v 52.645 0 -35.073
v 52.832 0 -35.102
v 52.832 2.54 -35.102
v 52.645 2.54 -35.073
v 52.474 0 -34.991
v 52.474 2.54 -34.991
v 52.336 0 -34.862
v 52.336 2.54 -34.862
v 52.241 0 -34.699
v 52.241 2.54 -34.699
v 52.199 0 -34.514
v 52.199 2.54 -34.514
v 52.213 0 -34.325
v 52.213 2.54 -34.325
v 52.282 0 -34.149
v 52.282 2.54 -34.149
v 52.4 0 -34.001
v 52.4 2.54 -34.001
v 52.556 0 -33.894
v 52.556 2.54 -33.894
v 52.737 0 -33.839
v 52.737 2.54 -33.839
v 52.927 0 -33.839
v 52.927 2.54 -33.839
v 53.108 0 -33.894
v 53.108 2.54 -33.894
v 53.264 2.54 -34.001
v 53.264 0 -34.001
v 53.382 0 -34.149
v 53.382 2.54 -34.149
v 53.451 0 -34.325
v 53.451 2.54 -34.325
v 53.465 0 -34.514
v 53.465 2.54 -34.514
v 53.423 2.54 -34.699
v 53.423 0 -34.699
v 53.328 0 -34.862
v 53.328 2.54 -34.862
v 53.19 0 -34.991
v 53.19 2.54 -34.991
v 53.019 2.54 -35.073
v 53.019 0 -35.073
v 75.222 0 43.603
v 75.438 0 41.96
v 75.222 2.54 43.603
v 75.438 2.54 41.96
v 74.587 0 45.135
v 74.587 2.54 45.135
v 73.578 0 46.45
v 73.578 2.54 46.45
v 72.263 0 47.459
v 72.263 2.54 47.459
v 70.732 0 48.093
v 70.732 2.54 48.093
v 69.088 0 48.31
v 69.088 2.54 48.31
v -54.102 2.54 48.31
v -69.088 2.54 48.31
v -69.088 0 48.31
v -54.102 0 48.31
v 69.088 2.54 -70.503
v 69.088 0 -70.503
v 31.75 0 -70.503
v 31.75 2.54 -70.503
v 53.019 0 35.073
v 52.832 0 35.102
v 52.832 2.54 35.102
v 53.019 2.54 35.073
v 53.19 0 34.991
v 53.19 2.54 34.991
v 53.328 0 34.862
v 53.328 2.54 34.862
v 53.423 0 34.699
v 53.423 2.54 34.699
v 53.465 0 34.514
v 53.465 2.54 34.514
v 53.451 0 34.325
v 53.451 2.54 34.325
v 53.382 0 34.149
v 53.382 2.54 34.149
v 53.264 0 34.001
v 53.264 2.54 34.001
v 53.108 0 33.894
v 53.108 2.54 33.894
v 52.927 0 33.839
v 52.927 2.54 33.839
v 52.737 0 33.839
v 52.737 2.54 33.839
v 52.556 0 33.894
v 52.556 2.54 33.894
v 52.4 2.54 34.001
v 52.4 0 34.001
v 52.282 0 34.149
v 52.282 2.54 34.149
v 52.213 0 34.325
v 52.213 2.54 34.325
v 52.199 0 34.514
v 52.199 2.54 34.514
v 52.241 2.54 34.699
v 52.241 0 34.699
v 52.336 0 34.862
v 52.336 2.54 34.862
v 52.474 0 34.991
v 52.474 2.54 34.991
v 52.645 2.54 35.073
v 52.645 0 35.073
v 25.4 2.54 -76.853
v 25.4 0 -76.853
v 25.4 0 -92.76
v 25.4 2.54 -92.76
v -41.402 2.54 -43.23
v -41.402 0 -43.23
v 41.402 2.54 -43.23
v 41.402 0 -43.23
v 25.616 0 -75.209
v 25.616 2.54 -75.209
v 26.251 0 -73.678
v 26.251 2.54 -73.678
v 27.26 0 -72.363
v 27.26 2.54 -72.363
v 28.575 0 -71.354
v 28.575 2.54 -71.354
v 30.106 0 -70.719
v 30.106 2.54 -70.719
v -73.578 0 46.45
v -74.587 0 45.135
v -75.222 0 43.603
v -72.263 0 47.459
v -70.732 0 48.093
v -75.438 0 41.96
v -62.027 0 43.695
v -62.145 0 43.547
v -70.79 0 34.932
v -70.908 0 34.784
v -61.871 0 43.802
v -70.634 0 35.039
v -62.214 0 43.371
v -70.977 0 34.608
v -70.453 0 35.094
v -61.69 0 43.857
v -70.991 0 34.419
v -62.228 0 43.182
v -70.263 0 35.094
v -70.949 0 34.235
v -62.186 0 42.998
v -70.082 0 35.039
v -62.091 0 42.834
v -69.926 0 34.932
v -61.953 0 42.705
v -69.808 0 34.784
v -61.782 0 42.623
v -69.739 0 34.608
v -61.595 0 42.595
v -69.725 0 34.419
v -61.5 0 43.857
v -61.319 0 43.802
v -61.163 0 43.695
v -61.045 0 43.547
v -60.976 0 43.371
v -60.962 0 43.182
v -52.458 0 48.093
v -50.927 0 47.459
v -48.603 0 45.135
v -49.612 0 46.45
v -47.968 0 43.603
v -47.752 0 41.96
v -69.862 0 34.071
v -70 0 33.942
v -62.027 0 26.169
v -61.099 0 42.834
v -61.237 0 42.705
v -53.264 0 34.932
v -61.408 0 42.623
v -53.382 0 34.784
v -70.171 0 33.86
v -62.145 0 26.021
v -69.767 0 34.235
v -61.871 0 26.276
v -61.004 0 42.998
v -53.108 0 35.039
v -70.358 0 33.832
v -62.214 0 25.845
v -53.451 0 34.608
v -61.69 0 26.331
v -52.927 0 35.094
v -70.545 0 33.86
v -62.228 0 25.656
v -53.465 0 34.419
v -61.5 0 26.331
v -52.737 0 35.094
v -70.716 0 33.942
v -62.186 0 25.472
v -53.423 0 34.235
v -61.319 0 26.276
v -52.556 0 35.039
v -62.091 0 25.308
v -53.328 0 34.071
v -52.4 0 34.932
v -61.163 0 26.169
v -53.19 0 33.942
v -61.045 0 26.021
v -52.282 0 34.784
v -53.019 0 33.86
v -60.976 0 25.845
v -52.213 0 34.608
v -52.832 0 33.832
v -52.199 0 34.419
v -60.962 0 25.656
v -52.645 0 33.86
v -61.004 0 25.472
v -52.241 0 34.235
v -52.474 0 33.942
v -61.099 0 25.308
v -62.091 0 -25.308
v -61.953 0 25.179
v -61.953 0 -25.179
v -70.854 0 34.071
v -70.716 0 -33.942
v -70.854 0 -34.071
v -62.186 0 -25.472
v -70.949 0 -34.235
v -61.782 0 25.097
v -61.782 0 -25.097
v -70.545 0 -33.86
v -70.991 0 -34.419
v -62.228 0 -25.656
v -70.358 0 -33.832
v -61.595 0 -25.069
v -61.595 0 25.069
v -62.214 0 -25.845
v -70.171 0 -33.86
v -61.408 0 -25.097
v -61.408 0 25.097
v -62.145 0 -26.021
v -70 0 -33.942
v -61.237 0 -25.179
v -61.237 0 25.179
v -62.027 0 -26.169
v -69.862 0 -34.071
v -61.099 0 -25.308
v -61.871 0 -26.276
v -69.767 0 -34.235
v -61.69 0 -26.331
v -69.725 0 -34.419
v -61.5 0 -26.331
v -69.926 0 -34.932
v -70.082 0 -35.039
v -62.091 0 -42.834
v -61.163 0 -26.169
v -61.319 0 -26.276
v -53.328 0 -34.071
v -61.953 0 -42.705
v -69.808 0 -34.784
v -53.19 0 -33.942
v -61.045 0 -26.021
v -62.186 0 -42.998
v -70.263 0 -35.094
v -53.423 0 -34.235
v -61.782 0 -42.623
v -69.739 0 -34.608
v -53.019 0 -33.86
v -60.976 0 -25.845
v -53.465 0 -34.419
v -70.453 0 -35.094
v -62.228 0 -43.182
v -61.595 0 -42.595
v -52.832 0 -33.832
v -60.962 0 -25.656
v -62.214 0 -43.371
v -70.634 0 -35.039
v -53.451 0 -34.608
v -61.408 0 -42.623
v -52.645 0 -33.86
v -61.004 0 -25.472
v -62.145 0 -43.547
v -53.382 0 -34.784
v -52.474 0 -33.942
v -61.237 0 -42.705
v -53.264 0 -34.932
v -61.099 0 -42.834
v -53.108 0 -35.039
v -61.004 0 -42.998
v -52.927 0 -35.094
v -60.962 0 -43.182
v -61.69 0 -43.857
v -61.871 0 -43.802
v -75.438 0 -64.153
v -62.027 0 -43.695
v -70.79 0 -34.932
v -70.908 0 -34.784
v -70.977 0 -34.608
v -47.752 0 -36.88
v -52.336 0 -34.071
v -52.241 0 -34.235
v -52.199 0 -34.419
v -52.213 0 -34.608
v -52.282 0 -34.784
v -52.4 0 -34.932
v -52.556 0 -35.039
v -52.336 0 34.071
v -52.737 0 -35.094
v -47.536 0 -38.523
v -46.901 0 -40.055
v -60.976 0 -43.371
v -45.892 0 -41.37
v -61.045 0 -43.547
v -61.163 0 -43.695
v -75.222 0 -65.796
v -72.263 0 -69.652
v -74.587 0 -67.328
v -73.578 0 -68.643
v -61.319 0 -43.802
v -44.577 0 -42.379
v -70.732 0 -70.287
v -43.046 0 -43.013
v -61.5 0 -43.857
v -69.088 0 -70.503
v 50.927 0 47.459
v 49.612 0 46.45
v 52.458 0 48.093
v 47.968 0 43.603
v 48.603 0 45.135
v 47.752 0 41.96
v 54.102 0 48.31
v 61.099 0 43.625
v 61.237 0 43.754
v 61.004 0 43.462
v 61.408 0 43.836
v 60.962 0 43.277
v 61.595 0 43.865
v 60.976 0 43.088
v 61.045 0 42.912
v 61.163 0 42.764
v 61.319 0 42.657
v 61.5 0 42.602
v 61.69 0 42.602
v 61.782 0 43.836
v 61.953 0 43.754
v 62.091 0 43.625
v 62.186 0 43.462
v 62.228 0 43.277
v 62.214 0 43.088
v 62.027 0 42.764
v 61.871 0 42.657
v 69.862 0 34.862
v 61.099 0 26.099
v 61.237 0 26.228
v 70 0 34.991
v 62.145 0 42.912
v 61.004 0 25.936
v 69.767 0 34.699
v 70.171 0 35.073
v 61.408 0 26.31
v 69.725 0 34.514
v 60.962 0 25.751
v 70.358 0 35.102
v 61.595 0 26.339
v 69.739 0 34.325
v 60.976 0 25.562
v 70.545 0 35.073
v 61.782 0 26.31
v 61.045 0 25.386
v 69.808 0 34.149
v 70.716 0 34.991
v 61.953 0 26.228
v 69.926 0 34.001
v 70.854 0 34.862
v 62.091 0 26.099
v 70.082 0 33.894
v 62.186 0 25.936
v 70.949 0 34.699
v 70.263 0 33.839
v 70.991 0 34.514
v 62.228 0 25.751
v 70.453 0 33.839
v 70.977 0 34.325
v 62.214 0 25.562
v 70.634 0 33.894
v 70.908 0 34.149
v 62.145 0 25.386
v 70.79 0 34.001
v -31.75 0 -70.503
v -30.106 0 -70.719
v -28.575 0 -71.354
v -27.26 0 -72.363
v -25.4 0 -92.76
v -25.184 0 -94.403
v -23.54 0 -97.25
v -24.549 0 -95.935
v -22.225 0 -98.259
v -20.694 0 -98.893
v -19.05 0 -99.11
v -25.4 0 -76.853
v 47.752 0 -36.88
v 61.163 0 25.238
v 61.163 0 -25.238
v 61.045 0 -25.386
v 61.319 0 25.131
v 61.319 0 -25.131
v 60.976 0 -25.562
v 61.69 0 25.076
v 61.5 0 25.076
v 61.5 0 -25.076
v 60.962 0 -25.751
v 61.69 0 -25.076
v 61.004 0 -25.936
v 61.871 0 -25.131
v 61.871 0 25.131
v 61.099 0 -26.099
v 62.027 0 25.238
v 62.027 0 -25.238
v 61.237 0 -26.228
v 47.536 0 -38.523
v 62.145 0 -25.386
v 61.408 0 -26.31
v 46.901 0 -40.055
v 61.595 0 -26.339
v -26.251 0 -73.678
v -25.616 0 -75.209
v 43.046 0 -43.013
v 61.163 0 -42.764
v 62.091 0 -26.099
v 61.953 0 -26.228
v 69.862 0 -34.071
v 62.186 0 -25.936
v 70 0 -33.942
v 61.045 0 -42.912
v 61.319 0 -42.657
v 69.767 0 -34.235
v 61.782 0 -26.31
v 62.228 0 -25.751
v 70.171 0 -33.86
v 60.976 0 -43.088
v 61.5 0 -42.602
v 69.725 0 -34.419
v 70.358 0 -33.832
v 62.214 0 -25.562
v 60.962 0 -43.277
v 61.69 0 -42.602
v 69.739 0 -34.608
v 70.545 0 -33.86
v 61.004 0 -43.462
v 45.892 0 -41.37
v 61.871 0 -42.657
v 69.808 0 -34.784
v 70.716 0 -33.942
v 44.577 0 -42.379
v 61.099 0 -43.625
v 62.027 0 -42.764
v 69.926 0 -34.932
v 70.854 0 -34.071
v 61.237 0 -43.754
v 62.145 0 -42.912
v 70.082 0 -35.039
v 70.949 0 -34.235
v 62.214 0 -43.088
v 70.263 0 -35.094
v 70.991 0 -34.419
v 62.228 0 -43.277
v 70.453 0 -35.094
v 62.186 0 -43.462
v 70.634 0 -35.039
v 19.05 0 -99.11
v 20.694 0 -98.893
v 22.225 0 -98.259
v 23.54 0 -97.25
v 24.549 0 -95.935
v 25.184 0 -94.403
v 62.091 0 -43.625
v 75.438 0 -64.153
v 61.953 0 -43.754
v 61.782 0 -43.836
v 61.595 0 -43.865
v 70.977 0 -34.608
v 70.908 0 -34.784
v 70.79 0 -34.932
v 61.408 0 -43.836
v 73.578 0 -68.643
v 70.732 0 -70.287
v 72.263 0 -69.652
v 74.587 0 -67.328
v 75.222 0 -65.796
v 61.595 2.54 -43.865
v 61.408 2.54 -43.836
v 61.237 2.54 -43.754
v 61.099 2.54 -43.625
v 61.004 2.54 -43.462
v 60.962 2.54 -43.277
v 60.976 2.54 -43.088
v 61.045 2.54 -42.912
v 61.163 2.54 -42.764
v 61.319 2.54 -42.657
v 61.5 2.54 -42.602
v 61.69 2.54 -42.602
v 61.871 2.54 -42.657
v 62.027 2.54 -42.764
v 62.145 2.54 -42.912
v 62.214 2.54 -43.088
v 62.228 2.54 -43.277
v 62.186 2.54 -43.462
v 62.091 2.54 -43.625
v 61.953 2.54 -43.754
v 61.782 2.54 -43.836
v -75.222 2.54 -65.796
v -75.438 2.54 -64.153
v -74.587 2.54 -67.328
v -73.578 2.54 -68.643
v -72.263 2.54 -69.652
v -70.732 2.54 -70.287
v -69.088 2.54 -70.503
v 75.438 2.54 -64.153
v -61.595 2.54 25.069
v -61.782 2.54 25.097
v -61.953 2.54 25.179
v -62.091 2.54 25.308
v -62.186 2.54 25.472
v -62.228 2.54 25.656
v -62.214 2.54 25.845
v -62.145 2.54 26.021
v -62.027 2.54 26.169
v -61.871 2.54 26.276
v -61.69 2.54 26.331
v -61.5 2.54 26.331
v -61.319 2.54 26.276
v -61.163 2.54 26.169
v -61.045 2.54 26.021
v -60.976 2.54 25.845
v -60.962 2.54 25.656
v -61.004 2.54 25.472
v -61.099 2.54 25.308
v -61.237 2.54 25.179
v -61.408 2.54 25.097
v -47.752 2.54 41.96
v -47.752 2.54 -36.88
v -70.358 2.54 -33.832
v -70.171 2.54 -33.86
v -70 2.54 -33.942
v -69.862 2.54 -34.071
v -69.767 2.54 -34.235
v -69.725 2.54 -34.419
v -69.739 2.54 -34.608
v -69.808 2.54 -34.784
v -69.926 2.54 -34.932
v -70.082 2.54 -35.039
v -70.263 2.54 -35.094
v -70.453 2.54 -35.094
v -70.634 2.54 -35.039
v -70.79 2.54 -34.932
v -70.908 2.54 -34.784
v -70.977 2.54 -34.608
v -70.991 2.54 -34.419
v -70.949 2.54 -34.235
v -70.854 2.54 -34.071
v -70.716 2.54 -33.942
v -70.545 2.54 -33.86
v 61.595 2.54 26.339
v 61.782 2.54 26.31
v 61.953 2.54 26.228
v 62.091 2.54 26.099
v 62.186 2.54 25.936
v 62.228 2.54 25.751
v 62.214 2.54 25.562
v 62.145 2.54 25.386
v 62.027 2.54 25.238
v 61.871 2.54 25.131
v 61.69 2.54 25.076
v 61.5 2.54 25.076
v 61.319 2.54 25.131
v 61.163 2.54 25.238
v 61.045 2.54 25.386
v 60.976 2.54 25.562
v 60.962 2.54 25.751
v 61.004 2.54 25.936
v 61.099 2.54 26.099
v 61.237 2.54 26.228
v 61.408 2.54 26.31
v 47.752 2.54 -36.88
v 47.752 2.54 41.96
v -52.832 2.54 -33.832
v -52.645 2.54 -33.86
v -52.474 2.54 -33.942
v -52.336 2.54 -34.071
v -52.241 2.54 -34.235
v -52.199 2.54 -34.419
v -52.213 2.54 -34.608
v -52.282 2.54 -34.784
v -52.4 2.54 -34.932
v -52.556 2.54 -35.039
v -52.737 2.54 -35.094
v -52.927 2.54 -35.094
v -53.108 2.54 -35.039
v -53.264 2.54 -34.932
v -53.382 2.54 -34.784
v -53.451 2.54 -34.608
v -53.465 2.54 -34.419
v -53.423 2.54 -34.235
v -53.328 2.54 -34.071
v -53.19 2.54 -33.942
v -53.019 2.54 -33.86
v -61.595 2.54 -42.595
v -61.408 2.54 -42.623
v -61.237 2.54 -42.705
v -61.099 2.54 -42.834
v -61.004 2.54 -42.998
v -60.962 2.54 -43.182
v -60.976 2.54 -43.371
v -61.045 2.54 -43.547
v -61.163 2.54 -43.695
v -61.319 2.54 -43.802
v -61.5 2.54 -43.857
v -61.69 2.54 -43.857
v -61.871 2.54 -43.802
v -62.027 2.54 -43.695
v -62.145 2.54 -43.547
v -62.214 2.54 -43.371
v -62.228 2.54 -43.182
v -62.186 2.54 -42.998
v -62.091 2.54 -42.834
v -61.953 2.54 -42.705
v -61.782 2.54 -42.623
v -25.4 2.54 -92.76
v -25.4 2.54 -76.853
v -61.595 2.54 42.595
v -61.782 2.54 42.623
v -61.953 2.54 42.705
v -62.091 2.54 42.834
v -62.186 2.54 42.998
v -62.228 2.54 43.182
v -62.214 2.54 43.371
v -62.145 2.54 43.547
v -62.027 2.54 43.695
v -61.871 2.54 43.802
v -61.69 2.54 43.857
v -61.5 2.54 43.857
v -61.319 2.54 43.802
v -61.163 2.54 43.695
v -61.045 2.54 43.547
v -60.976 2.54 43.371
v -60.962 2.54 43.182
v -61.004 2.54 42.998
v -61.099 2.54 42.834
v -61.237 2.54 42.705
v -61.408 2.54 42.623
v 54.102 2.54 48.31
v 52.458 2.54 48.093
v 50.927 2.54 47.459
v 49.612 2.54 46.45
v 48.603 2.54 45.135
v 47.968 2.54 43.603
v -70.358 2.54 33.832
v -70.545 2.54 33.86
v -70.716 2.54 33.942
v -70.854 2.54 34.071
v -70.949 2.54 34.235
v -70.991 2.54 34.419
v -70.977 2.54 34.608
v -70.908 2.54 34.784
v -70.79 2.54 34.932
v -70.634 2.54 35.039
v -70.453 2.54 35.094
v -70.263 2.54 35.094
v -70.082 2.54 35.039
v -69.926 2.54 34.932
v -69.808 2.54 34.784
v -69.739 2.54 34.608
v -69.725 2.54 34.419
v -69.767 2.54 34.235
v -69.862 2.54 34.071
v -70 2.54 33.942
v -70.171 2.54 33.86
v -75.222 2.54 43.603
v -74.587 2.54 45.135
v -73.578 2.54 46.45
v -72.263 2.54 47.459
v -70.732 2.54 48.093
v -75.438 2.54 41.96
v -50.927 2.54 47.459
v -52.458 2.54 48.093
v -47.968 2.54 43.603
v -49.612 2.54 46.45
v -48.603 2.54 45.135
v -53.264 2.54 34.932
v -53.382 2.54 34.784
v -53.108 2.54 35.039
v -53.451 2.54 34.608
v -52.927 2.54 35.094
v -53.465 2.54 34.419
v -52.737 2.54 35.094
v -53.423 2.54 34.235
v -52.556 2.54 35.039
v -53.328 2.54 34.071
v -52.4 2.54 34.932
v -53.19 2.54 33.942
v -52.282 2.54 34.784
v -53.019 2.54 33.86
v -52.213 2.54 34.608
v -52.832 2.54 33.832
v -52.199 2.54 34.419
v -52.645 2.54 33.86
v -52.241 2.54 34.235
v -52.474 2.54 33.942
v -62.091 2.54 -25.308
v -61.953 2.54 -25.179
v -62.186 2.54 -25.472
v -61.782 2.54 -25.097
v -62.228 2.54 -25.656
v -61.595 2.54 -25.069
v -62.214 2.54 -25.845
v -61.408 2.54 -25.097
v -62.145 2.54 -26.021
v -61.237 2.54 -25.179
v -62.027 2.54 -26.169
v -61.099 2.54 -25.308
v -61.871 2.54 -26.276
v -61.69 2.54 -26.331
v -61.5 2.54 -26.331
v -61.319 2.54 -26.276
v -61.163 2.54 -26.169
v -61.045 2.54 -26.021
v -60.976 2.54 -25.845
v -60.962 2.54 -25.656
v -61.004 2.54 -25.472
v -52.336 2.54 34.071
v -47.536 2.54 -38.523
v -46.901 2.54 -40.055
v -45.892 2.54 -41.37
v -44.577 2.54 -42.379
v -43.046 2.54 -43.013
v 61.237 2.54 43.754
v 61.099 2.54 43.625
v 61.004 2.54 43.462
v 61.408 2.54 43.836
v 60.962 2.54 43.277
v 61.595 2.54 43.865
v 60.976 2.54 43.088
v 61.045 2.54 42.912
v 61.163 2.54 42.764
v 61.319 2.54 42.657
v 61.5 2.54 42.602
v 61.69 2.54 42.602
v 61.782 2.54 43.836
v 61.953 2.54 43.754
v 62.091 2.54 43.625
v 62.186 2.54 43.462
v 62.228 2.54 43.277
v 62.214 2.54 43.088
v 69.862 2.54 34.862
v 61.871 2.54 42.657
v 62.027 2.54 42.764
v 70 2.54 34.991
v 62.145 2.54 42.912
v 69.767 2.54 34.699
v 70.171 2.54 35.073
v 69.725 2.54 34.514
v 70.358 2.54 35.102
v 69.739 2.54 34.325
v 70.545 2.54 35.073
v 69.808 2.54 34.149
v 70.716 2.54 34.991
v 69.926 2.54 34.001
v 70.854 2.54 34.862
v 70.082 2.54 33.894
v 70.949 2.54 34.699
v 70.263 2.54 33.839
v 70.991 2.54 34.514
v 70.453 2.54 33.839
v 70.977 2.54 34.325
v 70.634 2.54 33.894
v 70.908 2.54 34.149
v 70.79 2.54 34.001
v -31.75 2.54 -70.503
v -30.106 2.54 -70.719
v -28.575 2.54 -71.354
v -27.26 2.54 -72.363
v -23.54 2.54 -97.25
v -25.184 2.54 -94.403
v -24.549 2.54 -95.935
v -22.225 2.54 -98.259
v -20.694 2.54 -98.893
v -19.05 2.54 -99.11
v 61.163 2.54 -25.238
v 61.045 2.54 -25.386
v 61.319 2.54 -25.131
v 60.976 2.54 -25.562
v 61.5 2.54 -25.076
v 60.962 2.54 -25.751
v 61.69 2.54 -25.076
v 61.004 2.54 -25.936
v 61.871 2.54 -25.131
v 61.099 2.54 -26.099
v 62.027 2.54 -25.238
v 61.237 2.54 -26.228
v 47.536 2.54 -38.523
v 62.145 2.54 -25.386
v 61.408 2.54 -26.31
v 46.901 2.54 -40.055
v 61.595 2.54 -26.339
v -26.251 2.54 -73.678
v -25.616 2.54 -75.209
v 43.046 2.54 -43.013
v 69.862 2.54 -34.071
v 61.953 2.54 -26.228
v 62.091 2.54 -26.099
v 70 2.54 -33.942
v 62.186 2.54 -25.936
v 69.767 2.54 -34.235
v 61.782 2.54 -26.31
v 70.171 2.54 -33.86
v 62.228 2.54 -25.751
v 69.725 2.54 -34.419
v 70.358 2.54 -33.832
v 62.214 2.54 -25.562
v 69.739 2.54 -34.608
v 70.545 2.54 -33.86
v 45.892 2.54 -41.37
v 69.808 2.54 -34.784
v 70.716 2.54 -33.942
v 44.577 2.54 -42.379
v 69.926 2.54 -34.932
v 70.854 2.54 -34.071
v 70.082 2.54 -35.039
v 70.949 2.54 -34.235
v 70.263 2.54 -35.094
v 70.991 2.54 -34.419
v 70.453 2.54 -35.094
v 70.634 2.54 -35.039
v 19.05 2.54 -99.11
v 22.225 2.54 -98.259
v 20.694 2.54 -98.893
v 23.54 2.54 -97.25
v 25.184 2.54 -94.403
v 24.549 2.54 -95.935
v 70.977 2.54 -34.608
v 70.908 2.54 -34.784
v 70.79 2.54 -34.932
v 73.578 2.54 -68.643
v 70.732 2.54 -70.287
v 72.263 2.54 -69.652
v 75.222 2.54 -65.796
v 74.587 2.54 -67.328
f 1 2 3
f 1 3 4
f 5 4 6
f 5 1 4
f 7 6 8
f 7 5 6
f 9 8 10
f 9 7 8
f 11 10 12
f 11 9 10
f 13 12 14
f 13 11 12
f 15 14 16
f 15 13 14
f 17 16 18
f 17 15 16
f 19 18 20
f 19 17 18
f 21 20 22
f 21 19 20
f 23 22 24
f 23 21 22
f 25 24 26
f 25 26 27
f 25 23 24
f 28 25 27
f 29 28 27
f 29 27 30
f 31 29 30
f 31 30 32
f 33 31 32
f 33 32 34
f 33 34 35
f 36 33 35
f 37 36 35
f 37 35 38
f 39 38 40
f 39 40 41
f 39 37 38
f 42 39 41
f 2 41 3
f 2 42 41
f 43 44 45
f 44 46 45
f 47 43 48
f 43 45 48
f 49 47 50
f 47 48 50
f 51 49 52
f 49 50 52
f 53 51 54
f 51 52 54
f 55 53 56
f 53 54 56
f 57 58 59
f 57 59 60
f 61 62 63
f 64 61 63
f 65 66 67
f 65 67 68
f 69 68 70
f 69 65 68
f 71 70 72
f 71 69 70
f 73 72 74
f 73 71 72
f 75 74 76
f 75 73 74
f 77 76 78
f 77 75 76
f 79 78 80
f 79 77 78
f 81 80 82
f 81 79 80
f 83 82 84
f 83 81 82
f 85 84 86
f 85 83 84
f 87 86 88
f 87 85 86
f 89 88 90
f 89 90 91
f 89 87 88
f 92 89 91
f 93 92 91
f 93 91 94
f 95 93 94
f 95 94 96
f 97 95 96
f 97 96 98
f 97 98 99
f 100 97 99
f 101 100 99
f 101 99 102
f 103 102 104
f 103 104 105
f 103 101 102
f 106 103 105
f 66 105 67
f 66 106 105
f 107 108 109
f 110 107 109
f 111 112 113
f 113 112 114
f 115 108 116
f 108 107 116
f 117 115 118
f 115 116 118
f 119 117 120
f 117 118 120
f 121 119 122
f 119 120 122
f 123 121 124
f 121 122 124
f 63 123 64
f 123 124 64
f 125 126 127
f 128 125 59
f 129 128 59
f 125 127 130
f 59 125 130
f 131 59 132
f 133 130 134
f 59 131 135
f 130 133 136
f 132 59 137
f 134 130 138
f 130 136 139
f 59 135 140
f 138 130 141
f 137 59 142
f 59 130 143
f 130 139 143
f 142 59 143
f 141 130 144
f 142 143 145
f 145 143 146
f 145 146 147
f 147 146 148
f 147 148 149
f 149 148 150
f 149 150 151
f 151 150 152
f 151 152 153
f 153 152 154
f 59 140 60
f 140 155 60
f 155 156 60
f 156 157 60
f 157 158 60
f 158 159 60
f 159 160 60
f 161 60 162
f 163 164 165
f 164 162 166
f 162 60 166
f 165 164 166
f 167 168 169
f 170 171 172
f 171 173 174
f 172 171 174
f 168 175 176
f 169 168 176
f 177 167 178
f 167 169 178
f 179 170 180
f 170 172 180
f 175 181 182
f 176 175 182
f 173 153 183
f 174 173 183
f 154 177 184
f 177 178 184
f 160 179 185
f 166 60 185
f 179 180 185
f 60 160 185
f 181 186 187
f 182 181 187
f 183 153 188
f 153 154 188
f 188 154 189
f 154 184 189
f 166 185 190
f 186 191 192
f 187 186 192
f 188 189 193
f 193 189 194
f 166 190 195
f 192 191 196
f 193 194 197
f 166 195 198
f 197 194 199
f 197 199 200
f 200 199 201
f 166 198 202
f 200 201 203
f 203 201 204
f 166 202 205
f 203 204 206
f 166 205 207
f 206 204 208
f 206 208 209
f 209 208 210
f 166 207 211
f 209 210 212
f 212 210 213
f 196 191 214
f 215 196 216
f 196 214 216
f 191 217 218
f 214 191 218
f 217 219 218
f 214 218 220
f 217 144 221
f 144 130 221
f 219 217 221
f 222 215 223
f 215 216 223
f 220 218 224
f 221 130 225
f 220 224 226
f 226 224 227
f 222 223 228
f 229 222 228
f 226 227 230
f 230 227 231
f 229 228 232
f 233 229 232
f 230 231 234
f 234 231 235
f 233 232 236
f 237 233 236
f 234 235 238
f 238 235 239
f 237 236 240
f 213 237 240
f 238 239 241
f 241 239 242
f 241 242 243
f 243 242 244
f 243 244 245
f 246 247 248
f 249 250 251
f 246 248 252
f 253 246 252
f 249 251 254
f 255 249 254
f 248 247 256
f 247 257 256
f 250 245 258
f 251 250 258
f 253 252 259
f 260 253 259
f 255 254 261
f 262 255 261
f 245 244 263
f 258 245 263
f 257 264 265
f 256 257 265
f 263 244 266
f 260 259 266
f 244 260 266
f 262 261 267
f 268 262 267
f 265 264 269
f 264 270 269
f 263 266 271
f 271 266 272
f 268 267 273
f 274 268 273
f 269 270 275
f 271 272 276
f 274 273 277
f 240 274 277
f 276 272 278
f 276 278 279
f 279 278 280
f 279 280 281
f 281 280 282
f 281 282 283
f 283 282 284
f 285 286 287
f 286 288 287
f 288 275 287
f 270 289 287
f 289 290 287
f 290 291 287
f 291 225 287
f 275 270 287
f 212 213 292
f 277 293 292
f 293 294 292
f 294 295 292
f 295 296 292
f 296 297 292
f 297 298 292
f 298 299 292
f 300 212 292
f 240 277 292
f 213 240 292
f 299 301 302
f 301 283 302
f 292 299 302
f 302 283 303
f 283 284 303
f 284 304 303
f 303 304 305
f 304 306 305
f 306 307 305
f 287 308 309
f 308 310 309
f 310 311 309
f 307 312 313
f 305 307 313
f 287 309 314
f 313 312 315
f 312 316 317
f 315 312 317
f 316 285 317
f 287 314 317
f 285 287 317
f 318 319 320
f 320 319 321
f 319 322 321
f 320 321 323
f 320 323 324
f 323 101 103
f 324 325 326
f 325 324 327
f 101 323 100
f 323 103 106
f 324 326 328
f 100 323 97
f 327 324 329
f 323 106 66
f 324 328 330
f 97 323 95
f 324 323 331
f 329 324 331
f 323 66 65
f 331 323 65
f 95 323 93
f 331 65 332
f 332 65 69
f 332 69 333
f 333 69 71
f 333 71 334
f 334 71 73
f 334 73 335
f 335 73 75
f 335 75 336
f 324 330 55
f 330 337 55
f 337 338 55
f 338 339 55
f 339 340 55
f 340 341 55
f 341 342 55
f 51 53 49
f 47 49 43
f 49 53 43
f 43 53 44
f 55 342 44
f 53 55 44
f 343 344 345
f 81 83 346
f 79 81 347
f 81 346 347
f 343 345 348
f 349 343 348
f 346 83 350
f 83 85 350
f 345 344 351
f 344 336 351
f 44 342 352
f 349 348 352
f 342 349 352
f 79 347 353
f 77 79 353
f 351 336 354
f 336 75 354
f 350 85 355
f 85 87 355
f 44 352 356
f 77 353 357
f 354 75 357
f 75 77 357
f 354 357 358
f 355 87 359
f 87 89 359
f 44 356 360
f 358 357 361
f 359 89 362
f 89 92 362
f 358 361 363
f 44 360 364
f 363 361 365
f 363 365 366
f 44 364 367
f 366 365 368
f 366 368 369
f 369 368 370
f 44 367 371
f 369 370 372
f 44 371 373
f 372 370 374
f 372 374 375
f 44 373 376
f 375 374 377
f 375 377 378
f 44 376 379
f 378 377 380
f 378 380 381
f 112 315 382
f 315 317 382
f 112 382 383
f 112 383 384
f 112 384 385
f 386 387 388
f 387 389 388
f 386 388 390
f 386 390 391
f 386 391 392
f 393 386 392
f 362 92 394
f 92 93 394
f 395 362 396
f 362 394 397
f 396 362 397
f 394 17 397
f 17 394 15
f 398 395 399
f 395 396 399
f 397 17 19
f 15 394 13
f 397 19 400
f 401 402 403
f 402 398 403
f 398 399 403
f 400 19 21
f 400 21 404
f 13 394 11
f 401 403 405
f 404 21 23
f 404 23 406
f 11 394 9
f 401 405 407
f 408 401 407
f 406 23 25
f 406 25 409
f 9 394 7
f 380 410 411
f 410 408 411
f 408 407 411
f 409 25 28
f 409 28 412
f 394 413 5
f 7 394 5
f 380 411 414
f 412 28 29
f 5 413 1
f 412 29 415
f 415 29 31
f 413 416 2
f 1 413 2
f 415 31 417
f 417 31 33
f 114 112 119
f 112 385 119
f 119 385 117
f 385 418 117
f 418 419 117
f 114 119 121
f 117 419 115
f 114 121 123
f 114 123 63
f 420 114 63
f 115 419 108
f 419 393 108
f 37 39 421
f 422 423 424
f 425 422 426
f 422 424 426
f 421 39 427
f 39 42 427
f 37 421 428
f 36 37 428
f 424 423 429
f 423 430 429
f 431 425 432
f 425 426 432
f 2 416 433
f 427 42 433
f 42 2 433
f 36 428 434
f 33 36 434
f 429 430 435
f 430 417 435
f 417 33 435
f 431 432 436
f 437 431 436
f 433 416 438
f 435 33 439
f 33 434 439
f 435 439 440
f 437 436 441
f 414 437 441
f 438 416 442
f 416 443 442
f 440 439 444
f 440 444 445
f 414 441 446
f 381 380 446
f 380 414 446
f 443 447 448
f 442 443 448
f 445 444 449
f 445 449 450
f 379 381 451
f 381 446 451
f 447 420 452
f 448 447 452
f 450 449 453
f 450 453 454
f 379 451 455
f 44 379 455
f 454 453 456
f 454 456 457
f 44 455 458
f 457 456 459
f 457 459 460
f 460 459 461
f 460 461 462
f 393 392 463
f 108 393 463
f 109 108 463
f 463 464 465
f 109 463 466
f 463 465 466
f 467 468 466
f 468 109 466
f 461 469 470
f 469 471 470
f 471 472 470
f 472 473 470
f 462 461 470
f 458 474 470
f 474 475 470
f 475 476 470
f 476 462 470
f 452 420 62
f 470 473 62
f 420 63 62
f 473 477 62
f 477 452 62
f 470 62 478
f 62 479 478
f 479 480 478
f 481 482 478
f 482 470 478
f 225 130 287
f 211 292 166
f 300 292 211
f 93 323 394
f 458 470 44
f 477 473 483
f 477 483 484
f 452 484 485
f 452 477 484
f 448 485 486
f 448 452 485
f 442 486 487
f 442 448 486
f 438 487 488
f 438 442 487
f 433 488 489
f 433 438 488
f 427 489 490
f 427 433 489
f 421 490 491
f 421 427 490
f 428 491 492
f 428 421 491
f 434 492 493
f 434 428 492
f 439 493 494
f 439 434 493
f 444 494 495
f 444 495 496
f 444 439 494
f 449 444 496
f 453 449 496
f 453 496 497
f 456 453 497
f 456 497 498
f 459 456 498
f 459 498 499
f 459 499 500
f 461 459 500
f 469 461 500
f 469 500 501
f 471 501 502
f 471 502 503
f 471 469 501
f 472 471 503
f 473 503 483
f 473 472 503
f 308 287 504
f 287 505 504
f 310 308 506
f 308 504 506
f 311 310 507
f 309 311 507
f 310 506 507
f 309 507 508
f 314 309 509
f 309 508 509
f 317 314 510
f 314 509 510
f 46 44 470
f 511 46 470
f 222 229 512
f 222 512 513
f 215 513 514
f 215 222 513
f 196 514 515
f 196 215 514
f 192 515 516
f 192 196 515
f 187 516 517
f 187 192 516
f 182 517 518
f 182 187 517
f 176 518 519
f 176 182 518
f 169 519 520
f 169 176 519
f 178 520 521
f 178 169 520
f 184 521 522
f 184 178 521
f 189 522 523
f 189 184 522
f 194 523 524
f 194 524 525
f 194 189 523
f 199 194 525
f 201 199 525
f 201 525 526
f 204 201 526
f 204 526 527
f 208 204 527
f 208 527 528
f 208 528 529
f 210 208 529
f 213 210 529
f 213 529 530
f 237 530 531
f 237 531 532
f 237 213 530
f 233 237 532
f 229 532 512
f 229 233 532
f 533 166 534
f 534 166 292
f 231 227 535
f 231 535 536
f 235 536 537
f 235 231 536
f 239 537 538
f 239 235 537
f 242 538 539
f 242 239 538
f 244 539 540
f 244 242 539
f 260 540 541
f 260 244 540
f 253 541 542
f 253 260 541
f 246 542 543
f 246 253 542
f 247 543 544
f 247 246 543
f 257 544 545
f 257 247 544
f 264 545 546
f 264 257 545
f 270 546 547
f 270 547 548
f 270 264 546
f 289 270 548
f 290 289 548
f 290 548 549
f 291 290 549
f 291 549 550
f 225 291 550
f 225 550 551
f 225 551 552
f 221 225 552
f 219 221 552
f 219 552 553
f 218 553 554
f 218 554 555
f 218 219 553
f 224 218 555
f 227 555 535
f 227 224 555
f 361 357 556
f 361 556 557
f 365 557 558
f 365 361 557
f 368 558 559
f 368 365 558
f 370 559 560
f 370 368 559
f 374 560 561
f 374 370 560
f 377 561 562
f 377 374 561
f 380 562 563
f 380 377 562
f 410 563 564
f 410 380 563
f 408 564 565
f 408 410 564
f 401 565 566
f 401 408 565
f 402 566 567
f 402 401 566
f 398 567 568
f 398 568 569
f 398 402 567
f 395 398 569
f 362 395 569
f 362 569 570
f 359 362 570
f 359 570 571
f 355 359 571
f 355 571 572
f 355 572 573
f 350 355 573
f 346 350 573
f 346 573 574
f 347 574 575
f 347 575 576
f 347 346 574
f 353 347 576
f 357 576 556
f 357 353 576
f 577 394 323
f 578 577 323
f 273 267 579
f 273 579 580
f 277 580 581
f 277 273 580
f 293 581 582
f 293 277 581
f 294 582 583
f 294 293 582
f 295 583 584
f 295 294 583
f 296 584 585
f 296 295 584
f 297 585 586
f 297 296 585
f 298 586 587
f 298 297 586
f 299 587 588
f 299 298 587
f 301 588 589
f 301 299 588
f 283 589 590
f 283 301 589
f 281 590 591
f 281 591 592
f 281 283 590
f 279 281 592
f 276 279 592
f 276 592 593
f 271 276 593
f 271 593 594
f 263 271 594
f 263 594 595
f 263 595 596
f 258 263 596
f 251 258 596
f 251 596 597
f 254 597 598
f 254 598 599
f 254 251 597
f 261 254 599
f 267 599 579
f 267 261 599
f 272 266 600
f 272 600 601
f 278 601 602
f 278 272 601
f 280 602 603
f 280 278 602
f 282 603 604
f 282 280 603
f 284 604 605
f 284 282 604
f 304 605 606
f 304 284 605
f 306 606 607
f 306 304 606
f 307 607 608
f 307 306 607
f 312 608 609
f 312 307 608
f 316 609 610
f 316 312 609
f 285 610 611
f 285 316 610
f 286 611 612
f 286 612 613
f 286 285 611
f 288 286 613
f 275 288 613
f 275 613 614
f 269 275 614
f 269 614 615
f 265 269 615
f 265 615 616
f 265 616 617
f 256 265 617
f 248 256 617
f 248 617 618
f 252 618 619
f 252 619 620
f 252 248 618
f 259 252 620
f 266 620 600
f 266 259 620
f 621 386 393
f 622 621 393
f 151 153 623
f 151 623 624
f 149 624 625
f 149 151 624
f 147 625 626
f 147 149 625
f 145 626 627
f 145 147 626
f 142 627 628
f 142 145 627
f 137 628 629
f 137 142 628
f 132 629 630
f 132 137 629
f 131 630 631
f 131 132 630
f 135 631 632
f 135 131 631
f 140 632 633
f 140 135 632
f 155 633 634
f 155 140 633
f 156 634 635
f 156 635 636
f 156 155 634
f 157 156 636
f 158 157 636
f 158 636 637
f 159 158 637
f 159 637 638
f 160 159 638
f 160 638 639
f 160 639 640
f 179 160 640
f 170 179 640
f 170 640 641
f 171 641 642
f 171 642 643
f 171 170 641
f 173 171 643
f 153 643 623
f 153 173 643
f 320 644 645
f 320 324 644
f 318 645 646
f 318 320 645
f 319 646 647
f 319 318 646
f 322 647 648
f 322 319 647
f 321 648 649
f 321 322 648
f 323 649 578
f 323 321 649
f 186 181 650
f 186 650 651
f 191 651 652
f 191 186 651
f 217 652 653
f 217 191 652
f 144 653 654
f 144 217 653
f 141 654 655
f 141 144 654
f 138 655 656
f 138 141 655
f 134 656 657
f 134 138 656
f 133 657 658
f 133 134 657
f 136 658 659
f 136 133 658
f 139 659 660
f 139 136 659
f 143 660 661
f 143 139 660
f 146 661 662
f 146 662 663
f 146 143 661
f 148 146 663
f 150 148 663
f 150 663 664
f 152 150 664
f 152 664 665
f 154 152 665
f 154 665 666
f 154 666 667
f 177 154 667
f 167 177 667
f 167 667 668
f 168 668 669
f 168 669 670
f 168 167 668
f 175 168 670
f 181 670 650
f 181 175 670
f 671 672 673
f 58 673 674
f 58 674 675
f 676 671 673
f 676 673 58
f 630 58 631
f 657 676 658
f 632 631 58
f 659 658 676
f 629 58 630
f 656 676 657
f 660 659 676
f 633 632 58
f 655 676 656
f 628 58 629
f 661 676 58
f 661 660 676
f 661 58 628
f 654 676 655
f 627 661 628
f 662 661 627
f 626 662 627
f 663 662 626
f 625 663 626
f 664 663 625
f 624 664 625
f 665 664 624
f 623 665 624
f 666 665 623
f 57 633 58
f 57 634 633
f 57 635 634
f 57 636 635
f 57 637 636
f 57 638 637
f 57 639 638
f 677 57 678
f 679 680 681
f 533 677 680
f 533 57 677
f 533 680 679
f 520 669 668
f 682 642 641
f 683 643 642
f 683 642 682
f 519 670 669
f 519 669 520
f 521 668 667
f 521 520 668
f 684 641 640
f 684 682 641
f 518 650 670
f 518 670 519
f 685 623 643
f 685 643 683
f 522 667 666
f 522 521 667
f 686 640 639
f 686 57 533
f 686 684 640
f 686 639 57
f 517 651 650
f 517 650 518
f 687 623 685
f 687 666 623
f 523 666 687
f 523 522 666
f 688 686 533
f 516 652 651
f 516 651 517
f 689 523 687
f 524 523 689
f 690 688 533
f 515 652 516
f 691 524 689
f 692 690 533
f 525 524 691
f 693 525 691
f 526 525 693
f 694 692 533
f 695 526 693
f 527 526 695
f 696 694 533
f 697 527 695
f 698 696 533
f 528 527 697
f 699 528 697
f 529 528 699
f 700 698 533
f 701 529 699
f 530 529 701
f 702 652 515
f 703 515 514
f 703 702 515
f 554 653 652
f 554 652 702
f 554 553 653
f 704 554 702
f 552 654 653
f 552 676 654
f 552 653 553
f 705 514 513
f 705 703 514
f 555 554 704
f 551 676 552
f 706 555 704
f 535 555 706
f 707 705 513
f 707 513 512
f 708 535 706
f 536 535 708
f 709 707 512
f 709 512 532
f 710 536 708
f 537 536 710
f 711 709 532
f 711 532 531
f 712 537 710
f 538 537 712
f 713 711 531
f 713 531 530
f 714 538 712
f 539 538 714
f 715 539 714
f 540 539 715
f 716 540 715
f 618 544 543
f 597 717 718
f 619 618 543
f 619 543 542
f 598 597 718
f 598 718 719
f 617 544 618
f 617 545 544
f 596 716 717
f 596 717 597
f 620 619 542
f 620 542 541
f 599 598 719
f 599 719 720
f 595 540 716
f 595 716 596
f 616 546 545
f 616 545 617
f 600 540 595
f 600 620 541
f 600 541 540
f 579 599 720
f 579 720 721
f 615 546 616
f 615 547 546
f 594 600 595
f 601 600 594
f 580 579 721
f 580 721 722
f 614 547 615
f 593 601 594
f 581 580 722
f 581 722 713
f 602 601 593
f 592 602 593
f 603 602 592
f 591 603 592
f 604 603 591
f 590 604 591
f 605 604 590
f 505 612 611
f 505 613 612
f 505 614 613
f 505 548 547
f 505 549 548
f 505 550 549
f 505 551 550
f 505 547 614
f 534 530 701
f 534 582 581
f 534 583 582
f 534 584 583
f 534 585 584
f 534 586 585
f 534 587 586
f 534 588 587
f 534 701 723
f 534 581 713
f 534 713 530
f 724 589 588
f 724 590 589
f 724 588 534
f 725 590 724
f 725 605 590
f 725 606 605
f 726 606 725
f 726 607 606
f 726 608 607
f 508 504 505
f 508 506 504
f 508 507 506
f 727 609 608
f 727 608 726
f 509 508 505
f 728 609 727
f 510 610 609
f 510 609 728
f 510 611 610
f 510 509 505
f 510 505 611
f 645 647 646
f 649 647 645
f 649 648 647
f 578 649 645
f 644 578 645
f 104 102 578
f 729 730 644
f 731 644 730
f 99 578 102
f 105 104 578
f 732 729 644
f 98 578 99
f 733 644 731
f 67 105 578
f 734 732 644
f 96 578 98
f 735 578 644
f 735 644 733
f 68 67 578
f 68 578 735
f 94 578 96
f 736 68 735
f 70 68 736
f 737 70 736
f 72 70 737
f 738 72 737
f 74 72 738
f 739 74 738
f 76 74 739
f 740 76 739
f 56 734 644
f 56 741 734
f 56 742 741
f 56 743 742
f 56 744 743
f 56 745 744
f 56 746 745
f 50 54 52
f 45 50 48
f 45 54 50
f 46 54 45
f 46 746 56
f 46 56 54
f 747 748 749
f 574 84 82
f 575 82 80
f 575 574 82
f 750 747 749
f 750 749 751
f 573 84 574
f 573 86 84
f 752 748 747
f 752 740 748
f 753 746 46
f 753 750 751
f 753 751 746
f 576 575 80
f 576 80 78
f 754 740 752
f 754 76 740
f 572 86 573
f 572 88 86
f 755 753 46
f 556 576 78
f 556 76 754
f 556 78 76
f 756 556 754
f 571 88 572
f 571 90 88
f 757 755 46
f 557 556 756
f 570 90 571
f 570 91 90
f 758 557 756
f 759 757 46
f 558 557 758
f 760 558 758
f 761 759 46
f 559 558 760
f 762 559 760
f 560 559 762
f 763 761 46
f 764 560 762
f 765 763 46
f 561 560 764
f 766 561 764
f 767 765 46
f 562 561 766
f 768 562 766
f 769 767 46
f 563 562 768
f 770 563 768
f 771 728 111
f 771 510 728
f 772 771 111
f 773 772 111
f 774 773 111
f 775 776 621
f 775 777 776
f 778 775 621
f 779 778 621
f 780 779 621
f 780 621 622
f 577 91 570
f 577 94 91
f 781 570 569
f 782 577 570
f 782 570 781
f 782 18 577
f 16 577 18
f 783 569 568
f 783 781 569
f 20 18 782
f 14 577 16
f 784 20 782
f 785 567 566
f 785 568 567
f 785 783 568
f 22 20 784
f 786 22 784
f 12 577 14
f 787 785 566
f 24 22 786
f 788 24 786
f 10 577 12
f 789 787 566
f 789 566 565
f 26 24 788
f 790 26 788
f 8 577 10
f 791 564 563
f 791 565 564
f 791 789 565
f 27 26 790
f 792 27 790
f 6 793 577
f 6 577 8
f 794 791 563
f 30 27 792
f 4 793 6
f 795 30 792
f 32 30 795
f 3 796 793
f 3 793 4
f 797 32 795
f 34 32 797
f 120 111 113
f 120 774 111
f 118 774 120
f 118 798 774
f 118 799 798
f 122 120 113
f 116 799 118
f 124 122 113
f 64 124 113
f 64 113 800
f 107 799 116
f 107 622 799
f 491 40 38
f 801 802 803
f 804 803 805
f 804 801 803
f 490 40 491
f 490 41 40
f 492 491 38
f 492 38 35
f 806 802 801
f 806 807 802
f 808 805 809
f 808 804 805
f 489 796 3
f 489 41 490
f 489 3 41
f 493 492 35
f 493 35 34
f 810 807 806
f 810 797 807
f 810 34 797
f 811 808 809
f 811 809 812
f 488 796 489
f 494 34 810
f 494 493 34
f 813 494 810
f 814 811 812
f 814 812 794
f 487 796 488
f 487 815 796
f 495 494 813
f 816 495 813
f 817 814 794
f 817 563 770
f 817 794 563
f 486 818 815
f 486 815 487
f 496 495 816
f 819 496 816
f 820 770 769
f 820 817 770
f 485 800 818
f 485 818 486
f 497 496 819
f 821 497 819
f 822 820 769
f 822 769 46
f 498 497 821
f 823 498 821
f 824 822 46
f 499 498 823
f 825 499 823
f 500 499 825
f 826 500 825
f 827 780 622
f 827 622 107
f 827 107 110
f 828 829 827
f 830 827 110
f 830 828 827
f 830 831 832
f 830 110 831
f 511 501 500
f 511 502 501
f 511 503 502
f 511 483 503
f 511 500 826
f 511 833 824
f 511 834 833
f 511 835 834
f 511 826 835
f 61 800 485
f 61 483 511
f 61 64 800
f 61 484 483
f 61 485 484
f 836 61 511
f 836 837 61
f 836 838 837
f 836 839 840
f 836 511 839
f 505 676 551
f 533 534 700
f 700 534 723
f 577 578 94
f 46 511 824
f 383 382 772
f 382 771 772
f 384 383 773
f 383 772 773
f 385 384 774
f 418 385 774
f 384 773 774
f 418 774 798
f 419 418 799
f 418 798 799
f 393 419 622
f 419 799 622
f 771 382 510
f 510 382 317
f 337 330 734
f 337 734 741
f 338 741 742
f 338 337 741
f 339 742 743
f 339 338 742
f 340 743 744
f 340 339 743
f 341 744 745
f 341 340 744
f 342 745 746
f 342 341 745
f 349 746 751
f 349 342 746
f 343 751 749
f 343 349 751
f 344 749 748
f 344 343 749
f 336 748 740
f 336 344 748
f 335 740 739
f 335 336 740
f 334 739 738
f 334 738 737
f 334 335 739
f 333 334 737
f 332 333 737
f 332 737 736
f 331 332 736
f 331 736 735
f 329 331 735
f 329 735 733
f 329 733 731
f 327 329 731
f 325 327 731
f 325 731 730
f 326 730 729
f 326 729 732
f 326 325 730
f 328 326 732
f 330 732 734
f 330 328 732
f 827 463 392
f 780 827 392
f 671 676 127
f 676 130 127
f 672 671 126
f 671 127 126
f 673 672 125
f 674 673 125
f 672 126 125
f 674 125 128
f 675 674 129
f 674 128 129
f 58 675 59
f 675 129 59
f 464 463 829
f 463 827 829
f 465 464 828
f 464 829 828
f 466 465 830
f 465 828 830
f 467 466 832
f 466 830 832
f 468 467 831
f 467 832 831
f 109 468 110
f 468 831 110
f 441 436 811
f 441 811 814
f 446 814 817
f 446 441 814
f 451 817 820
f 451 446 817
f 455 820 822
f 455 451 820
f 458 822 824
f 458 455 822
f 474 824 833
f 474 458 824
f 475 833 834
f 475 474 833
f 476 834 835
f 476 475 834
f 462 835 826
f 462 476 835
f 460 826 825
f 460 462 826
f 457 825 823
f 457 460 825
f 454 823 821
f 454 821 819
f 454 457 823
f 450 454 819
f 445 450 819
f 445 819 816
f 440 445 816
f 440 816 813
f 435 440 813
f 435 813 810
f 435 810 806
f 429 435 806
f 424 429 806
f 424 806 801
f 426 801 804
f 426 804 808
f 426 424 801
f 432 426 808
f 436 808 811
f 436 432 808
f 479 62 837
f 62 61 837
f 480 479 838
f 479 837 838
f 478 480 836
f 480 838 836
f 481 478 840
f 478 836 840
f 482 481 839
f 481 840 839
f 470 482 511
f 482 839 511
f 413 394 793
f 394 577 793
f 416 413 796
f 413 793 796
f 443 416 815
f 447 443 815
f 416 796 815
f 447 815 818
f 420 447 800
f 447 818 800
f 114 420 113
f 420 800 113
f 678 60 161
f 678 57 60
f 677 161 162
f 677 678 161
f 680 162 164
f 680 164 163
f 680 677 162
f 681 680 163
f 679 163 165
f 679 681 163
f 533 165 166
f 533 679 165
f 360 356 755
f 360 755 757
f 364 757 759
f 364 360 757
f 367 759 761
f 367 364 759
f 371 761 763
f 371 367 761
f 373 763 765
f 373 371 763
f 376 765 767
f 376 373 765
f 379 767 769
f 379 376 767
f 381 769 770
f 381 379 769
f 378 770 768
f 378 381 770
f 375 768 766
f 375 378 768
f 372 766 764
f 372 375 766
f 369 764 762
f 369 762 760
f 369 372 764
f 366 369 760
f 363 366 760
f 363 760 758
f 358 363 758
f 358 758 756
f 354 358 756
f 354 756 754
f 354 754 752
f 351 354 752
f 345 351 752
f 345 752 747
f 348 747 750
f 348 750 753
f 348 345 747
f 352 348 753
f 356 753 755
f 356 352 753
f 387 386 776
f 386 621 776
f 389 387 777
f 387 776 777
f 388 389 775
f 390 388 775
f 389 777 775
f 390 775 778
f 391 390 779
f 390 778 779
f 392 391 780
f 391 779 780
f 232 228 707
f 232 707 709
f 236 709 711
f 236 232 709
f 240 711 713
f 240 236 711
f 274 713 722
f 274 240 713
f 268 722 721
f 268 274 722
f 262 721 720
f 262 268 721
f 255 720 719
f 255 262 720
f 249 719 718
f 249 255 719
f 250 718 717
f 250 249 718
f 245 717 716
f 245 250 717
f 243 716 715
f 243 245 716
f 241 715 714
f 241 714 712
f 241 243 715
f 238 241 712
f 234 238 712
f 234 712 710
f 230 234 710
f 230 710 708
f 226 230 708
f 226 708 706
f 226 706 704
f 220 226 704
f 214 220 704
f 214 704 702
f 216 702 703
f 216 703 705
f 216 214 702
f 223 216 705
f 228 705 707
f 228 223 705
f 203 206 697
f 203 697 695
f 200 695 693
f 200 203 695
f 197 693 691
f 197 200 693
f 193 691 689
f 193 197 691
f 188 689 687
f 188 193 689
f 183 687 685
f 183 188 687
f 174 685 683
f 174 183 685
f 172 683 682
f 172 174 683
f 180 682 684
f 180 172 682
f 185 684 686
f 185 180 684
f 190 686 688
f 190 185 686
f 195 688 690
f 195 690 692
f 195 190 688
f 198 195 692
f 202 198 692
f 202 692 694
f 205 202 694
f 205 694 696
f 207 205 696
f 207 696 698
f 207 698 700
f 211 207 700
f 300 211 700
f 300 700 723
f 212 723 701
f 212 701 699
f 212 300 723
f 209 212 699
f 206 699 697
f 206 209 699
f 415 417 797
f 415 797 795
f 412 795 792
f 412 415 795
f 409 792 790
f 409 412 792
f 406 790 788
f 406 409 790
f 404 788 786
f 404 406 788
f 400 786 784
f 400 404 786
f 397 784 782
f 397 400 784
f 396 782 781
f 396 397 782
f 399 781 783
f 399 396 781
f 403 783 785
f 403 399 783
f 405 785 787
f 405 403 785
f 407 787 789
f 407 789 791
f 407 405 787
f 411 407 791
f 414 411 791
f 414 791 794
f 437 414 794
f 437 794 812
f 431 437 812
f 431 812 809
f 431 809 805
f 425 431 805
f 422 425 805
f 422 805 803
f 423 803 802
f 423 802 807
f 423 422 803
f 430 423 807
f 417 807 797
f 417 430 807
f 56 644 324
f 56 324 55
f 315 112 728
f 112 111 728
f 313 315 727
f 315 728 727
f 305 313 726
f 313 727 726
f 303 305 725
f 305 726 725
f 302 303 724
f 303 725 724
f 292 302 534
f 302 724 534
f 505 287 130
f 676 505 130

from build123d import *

# Parameters (mm, degrees)
SKETCH3_R           = 0.635
BOSS_EXTRUDE2_DEPTH = 2.54
SKETCH4_W           = 165.279862668
SKETCH4_H           = 127
CUT_EXTRUDE1_DEPTH  = 125.579462115
FILLET3_R           = 6.35


with BuildPart() as part:
    # Sketch3 → Boss-Extrude2 (new body)
    with BuildSketch(Plane(origin=(0, 0, 0), x_dir=(1, 0, 0), z_dir=(0, 1, 0))):
        Polygon((-75.438, 48.30953), (-75.438, -99.10953), (-47.752, -99.10953), (-47.752, 3.51009118), (-47.752, 43.22953), (47.752, 43.22953), (47.752, 3.51009118), (47.752, -99.10953), (75.438, -99.10953), (75.438, 48.30953), (75.438, 70.50296882), (25.4, 70.50296882), (25.4, 99.10953), (-25.4, 99.10953), (-25.4, 70.50296882), (-75.438, 70.50296882), align=None)
        with Locations(Location((-61.595, 43.22953, 0), (0, 0, 270))):
            Circle(SKETCH3_R, mode=Mode.SUBTRACT)
        with Locations(Location((-70.358, 34.46653, 0), (0, 0, 270))):
            Circle(SKETCH3_R, mode=Mode.SUBTRACT)
        with Locations(Location((-61.595, 25.70353, 0), (0, 0, 270))):
            Circle(SKETCH3_R, mode=Mode.SUBTRACT)
        with Locations(Location((-52.832, 34.46653, 0), (0, 0, 270))):
            Circle(SKETCH3_R, mode=Mode.SUBTRACT)
        with Locations(Location((-52.832, -34.46653, 0), (0, 0, 90))):
            Circle(SKETCH3_R, mode=Mode.SUBTRACT)
        with Locations(Location((-61.595, -25.70353, 0), (0, 0, 90))):
            Circle(SKETCH3_R, mode=Mode.SUBTRACT)
        with Locations(Location((-70.358, -34.46653, 0), (0, 0, 90))):
            Circle(SKETCH3_R, mode=Mode.SUBTRACT)
        with Locations(Location((-61.595, -43.22953, 0), (0, 0, 90))):
            Circle(SKETCH3_R, mode=Mode.SUBTRACT)
        with Locations(Location((61.595, -43.22953, 0), (0, 0, 270))):
            Circle(SKETCH3_R, mode=Mode.SUBTRACT)
        with Locations(Location((61.595, -25.70353, 0), (0, 0, 270))):
            Circle(SKETCH3_R, mode=Mode.SUBTRACT)
        with Locations(Location((52.832, -34.46653, 0), (0, 0, 270))):
            Circle(SKETCH3_R, mode=Mode.SUBTRACT)
        with Locations(Location((52.832, 34.46653, 0), (0, 0, 90))):
            Circle(SKETCH3_R, mode=Mode.SUBTRACT)
        with Locations(Location((61.595, 25.70353, 0), (0, 0, 90))):
            Circle(SKETCH3_R, mode=Mode.SUBTRACT)
        with Locations(Location((61.595, 43.22953, 0), (0, 0, 90))):
            Circle(SKETCH3_R, mode=Mode.SUBTRACT)
        with Locations(Location((70.358, -34.46653, 0), (0, 0, 270))):
            Circle(SKETCH3_R, mode=Mode.SUBTRACT)
        with Locations(Location((70.358, 34.46653, 0), (0, 0, 270))):
            Circle(SKETCH3_R, mode=Mode.SUBTRACT)
    extrude(amount=BOSS_EXTRUDE2_DEPTH)

    # Sketch4 → Cut-Extrude1 (cut, through all)
    with BuildSketch(Plane(origin=(0, 2.54, 0), x_dir=(1, 0, 0), z_dir=(0, 1, 0))):
        with Locations((3.512659274, -111.80953)):
            Rectangle(SKETCH4_W, SKETCH4_H)
    extrude(amount=-CUT_EXTRUDE1_DEPTH, mode=Mode.SUBTRACT)

    # Fillet3
    fillet3_edges = [part.edges().sort_by_distance(p)[0] for p in [
        (75.438, 1.27, 48.30953),
        (-75.438, 1.27, 48.30953),
        (-47.752, 1.27, 48.30953),
        (47.752, 1.27, 48.30953),
        (-75.438, 1.27, -70.50296882),
        (-25.4, 1.27, -70.50296882),
        (-25.4, 1.27, -99.10953),
        (25.4, 1.27, -99.10953),
        (25.4, 1.27, -70.50296882),
        (75.438, 1.27, -70.50296882),
        (47.752, 1.27, -43.22953),
        (-47.752, 1.27, -43.22953),
    ]]
    fillet(fillet3_edges, radius=FILLET3_R)


solid = part.part
